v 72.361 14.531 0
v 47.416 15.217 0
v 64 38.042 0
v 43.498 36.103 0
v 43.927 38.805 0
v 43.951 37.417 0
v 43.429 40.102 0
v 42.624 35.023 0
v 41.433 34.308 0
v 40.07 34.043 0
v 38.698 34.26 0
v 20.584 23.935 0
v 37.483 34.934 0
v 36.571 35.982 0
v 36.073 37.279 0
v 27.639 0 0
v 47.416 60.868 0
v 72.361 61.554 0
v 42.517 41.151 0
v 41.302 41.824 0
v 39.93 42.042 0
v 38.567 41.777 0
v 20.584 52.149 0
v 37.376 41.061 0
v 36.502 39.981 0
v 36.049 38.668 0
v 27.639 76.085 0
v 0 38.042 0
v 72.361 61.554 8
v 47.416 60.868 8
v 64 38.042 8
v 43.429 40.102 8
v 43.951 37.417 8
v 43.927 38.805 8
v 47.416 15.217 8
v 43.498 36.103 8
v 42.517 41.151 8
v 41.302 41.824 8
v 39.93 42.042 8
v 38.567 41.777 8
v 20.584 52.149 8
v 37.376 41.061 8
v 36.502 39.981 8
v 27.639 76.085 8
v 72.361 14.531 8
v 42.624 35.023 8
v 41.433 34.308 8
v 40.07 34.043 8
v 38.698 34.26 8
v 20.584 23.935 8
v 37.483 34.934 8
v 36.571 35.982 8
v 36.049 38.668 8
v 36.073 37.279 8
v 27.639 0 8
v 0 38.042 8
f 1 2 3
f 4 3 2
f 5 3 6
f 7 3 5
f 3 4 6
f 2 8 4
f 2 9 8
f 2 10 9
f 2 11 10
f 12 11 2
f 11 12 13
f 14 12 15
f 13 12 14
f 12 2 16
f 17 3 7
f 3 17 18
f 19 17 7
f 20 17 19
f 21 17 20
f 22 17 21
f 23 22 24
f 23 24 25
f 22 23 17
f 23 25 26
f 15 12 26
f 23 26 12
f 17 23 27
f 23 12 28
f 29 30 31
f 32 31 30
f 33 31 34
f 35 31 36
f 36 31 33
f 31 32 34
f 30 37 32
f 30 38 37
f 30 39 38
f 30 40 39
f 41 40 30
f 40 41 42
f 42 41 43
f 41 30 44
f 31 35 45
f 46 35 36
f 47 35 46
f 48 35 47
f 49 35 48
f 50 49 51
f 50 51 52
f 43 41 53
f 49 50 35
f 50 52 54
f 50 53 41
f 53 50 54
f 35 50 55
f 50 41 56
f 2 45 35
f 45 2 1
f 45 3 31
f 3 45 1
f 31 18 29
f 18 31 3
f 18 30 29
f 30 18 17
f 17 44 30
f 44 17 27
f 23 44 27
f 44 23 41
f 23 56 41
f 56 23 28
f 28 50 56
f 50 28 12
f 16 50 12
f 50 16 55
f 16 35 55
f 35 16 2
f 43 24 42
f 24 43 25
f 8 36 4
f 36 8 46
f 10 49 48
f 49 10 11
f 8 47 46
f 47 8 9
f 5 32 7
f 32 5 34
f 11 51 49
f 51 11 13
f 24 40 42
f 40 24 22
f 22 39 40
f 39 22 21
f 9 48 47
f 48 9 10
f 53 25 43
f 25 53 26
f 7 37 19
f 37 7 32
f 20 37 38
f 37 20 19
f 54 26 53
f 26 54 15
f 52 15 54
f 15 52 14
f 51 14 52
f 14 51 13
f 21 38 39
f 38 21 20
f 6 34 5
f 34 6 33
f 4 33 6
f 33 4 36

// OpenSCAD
$fn = 32;

// ----------------------------------------------------------------------
// Star wheel: 5-point blunt, R40
// ----------------------------------------------------------------------

// --- parameters (mm) ---
n_points = 5;             // number of points / teeth
r_out = 40;               // tip radius
r_in = 24;                // root radius
bore_r = 4;               // centre bore radius
plate_t = 8;              // plate thickness, Z (extrusion height)
bore_d = 8;               // centre bore diameter

profile = [[0, 38.042], [20.584, 23.935], [27.639, 0], [47.416, 15.217], [72.361, 14.531], [64, 38.042], [72.361, 61.554], [47.416, 60.868], [27.639, 76.085], [20.584, 52.149]];  // primary outline, 10 points, counter clockwise
void_1 = [[43.927, 38.805], [43.429, 40.102], [42.517, 41.151], [41.302, 41.824], [39.93, 42.042], [38.567, 41.777], [37.376, 41.061], [36.502, 39.981], [36.049, 38.668], [36.073, 37.279], [36.571, 35.982], [37.483, 34.934], [38.698, 34.26], [40.07, 34.043], [41.433, 34.308], [42.624, 35.023], [43.498, 36.103], [43.951, 37.417]];  // centre bore, 18 points

// --- the one profile operation ---
difference() {
  linear_extrude(height = plate_t) polygon(points = profile);
  translate([0, 0, -1])
    linear_extrude(height = plate_t + 2) polygon(points = void_1);
}
